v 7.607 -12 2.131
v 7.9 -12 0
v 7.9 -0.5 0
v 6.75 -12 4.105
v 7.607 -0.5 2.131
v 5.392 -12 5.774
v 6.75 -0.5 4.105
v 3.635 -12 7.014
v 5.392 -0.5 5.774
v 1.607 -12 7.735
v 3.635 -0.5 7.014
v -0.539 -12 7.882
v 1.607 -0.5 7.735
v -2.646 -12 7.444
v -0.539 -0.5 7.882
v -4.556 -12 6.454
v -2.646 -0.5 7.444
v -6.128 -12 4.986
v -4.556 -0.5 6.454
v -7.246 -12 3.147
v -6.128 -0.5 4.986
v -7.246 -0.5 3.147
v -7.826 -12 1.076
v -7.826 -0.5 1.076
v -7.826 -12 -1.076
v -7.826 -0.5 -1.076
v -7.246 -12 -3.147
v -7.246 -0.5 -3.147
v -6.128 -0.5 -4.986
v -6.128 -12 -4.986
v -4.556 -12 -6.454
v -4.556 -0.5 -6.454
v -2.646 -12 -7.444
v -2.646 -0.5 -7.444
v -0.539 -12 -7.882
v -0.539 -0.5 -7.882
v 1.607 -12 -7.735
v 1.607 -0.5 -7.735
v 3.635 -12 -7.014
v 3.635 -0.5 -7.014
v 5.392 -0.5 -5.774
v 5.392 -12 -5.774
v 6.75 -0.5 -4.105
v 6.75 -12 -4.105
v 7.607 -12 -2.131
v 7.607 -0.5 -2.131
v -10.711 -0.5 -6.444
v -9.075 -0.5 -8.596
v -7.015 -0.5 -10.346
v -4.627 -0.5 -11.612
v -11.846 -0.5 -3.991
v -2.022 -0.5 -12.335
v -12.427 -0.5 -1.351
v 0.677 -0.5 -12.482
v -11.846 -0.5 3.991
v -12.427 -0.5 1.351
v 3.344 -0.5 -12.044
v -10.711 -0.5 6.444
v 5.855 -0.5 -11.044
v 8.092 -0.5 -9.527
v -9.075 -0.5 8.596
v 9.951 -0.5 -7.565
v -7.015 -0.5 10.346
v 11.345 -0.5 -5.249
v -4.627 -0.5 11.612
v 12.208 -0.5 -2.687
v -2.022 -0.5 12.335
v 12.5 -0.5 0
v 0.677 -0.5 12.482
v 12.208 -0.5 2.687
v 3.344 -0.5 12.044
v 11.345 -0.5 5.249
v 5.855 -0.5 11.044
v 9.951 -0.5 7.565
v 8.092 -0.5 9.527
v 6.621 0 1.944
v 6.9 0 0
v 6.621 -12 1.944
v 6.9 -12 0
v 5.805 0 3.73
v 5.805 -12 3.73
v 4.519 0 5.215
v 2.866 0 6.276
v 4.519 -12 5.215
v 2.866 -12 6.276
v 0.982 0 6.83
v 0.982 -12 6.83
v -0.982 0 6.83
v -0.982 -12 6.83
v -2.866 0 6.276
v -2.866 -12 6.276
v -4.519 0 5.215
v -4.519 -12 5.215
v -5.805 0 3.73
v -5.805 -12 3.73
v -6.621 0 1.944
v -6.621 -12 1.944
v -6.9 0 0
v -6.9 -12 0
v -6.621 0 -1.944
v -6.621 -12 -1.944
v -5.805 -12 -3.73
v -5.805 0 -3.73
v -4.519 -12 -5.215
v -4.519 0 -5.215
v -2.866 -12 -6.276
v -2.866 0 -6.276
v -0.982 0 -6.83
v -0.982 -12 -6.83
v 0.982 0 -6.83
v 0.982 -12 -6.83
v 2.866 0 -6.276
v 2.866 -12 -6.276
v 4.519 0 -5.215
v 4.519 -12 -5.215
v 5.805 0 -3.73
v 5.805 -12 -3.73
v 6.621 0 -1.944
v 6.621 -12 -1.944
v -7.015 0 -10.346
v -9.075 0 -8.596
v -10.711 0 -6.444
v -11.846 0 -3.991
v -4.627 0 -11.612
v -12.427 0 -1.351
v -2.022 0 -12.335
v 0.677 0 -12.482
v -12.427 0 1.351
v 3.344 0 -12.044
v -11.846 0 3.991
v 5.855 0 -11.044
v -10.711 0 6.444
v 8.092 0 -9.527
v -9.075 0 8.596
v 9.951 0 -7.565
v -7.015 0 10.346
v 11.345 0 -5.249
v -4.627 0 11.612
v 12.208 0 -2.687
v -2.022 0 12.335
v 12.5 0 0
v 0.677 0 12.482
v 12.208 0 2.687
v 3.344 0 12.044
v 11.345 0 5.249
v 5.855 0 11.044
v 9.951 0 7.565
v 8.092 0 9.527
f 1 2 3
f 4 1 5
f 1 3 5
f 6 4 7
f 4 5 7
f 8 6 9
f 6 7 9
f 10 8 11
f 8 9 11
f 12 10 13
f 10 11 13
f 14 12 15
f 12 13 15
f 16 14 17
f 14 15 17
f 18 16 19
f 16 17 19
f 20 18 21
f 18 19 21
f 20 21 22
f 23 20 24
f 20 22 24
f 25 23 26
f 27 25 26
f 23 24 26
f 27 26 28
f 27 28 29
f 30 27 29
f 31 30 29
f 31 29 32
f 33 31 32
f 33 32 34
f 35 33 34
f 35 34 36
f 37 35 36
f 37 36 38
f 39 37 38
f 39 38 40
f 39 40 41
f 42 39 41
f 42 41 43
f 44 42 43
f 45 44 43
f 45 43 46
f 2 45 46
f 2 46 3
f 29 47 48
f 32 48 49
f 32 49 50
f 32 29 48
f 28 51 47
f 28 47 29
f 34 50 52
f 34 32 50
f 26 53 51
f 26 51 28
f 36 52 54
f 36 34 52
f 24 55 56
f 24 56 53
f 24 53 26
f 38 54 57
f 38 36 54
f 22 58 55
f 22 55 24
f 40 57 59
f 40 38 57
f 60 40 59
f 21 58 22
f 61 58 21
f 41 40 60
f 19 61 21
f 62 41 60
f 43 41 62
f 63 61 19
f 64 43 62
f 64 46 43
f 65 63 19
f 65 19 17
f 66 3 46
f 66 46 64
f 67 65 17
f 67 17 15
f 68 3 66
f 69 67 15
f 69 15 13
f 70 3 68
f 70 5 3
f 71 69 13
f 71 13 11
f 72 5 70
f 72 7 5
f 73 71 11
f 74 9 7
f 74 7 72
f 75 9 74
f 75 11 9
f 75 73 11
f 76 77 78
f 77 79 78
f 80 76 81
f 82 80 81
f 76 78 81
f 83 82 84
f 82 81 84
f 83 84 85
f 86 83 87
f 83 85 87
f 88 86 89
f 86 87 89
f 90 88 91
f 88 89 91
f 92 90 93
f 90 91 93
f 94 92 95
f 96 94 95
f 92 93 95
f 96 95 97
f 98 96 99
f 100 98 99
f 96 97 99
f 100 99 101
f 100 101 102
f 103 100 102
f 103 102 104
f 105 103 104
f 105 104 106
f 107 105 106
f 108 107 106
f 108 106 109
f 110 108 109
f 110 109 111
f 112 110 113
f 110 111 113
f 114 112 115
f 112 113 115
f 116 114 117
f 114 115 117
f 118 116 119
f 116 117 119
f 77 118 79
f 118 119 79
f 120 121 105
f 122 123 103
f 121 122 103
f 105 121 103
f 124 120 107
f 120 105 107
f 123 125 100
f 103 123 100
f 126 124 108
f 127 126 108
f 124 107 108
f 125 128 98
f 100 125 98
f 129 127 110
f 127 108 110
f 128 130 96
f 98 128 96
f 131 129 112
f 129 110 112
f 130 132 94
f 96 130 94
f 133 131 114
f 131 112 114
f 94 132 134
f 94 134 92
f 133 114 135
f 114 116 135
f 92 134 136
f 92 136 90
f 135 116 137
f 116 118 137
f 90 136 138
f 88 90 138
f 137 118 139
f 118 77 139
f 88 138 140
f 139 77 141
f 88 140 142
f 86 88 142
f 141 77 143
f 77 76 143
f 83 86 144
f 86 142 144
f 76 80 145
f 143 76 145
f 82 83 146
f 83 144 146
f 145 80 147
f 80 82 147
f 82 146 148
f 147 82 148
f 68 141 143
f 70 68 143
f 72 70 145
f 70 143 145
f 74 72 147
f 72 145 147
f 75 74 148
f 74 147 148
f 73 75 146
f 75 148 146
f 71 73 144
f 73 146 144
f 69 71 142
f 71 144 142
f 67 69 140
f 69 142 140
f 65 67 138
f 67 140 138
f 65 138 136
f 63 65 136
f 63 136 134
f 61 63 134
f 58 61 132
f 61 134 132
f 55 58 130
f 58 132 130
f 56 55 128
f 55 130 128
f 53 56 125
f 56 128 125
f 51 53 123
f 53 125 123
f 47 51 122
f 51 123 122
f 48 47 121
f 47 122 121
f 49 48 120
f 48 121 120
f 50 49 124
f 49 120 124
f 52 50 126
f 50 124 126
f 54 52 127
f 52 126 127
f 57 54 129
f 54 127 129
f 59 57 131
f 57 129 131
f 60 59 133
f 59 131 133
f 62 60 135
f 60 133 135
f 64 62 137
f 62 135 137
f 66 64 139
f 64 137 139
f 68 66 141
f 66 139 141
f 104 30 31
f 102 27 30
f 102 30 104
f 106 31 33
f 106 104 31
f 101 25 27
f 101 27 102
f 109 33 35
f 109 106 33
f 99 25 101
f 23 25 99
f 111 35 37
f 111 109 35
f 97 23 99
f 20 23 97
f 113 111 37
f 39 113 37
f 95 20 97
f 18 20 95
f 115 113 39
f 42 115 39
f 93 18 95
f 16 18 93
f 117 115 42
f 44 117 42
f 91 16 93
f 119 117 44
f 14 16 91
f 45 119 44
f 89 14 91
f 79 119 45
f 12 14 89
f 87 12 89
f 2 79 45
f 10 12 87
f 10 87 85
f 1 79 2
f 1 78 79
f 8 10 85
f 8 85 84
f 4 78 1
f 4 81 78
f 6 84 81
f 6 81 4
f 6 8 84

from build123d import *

# Parameters (mm, degrees)
F0_R      = 7.9
F0_R_2    = 6.9
F1_DEPTH  = 12
F2_R      = 12.5
F3_DEPTH  = 0.5
F3_FACE_R = 6.9
F4_DEPTH  = 0.5


with BuildPart() as f1:
    # F0 (on Front) → F1 (new body)
    with BuildSketch(Plane.XZ):
        Circle(F0_R)
        Circle(F0_R_2, mode=Mode.SUBTRACT)
    extrude(amount=F1_DEPTH)

    # F2 (on Front) → F3 (join)
    with BuildSketch(Plane.XZ):
        Circle(F2_R)
    extrude(amount=F3_DEPTH)

    # F3_face (on face) → F4 (cut)
    with BuildSketch(Plane.XZ.offset(0.5)):
        Circle(F3_FACE_R)
    extrude(amount=-F4_DEPTH, mode=Mode.SUBTRACT)


solid = f1.part
